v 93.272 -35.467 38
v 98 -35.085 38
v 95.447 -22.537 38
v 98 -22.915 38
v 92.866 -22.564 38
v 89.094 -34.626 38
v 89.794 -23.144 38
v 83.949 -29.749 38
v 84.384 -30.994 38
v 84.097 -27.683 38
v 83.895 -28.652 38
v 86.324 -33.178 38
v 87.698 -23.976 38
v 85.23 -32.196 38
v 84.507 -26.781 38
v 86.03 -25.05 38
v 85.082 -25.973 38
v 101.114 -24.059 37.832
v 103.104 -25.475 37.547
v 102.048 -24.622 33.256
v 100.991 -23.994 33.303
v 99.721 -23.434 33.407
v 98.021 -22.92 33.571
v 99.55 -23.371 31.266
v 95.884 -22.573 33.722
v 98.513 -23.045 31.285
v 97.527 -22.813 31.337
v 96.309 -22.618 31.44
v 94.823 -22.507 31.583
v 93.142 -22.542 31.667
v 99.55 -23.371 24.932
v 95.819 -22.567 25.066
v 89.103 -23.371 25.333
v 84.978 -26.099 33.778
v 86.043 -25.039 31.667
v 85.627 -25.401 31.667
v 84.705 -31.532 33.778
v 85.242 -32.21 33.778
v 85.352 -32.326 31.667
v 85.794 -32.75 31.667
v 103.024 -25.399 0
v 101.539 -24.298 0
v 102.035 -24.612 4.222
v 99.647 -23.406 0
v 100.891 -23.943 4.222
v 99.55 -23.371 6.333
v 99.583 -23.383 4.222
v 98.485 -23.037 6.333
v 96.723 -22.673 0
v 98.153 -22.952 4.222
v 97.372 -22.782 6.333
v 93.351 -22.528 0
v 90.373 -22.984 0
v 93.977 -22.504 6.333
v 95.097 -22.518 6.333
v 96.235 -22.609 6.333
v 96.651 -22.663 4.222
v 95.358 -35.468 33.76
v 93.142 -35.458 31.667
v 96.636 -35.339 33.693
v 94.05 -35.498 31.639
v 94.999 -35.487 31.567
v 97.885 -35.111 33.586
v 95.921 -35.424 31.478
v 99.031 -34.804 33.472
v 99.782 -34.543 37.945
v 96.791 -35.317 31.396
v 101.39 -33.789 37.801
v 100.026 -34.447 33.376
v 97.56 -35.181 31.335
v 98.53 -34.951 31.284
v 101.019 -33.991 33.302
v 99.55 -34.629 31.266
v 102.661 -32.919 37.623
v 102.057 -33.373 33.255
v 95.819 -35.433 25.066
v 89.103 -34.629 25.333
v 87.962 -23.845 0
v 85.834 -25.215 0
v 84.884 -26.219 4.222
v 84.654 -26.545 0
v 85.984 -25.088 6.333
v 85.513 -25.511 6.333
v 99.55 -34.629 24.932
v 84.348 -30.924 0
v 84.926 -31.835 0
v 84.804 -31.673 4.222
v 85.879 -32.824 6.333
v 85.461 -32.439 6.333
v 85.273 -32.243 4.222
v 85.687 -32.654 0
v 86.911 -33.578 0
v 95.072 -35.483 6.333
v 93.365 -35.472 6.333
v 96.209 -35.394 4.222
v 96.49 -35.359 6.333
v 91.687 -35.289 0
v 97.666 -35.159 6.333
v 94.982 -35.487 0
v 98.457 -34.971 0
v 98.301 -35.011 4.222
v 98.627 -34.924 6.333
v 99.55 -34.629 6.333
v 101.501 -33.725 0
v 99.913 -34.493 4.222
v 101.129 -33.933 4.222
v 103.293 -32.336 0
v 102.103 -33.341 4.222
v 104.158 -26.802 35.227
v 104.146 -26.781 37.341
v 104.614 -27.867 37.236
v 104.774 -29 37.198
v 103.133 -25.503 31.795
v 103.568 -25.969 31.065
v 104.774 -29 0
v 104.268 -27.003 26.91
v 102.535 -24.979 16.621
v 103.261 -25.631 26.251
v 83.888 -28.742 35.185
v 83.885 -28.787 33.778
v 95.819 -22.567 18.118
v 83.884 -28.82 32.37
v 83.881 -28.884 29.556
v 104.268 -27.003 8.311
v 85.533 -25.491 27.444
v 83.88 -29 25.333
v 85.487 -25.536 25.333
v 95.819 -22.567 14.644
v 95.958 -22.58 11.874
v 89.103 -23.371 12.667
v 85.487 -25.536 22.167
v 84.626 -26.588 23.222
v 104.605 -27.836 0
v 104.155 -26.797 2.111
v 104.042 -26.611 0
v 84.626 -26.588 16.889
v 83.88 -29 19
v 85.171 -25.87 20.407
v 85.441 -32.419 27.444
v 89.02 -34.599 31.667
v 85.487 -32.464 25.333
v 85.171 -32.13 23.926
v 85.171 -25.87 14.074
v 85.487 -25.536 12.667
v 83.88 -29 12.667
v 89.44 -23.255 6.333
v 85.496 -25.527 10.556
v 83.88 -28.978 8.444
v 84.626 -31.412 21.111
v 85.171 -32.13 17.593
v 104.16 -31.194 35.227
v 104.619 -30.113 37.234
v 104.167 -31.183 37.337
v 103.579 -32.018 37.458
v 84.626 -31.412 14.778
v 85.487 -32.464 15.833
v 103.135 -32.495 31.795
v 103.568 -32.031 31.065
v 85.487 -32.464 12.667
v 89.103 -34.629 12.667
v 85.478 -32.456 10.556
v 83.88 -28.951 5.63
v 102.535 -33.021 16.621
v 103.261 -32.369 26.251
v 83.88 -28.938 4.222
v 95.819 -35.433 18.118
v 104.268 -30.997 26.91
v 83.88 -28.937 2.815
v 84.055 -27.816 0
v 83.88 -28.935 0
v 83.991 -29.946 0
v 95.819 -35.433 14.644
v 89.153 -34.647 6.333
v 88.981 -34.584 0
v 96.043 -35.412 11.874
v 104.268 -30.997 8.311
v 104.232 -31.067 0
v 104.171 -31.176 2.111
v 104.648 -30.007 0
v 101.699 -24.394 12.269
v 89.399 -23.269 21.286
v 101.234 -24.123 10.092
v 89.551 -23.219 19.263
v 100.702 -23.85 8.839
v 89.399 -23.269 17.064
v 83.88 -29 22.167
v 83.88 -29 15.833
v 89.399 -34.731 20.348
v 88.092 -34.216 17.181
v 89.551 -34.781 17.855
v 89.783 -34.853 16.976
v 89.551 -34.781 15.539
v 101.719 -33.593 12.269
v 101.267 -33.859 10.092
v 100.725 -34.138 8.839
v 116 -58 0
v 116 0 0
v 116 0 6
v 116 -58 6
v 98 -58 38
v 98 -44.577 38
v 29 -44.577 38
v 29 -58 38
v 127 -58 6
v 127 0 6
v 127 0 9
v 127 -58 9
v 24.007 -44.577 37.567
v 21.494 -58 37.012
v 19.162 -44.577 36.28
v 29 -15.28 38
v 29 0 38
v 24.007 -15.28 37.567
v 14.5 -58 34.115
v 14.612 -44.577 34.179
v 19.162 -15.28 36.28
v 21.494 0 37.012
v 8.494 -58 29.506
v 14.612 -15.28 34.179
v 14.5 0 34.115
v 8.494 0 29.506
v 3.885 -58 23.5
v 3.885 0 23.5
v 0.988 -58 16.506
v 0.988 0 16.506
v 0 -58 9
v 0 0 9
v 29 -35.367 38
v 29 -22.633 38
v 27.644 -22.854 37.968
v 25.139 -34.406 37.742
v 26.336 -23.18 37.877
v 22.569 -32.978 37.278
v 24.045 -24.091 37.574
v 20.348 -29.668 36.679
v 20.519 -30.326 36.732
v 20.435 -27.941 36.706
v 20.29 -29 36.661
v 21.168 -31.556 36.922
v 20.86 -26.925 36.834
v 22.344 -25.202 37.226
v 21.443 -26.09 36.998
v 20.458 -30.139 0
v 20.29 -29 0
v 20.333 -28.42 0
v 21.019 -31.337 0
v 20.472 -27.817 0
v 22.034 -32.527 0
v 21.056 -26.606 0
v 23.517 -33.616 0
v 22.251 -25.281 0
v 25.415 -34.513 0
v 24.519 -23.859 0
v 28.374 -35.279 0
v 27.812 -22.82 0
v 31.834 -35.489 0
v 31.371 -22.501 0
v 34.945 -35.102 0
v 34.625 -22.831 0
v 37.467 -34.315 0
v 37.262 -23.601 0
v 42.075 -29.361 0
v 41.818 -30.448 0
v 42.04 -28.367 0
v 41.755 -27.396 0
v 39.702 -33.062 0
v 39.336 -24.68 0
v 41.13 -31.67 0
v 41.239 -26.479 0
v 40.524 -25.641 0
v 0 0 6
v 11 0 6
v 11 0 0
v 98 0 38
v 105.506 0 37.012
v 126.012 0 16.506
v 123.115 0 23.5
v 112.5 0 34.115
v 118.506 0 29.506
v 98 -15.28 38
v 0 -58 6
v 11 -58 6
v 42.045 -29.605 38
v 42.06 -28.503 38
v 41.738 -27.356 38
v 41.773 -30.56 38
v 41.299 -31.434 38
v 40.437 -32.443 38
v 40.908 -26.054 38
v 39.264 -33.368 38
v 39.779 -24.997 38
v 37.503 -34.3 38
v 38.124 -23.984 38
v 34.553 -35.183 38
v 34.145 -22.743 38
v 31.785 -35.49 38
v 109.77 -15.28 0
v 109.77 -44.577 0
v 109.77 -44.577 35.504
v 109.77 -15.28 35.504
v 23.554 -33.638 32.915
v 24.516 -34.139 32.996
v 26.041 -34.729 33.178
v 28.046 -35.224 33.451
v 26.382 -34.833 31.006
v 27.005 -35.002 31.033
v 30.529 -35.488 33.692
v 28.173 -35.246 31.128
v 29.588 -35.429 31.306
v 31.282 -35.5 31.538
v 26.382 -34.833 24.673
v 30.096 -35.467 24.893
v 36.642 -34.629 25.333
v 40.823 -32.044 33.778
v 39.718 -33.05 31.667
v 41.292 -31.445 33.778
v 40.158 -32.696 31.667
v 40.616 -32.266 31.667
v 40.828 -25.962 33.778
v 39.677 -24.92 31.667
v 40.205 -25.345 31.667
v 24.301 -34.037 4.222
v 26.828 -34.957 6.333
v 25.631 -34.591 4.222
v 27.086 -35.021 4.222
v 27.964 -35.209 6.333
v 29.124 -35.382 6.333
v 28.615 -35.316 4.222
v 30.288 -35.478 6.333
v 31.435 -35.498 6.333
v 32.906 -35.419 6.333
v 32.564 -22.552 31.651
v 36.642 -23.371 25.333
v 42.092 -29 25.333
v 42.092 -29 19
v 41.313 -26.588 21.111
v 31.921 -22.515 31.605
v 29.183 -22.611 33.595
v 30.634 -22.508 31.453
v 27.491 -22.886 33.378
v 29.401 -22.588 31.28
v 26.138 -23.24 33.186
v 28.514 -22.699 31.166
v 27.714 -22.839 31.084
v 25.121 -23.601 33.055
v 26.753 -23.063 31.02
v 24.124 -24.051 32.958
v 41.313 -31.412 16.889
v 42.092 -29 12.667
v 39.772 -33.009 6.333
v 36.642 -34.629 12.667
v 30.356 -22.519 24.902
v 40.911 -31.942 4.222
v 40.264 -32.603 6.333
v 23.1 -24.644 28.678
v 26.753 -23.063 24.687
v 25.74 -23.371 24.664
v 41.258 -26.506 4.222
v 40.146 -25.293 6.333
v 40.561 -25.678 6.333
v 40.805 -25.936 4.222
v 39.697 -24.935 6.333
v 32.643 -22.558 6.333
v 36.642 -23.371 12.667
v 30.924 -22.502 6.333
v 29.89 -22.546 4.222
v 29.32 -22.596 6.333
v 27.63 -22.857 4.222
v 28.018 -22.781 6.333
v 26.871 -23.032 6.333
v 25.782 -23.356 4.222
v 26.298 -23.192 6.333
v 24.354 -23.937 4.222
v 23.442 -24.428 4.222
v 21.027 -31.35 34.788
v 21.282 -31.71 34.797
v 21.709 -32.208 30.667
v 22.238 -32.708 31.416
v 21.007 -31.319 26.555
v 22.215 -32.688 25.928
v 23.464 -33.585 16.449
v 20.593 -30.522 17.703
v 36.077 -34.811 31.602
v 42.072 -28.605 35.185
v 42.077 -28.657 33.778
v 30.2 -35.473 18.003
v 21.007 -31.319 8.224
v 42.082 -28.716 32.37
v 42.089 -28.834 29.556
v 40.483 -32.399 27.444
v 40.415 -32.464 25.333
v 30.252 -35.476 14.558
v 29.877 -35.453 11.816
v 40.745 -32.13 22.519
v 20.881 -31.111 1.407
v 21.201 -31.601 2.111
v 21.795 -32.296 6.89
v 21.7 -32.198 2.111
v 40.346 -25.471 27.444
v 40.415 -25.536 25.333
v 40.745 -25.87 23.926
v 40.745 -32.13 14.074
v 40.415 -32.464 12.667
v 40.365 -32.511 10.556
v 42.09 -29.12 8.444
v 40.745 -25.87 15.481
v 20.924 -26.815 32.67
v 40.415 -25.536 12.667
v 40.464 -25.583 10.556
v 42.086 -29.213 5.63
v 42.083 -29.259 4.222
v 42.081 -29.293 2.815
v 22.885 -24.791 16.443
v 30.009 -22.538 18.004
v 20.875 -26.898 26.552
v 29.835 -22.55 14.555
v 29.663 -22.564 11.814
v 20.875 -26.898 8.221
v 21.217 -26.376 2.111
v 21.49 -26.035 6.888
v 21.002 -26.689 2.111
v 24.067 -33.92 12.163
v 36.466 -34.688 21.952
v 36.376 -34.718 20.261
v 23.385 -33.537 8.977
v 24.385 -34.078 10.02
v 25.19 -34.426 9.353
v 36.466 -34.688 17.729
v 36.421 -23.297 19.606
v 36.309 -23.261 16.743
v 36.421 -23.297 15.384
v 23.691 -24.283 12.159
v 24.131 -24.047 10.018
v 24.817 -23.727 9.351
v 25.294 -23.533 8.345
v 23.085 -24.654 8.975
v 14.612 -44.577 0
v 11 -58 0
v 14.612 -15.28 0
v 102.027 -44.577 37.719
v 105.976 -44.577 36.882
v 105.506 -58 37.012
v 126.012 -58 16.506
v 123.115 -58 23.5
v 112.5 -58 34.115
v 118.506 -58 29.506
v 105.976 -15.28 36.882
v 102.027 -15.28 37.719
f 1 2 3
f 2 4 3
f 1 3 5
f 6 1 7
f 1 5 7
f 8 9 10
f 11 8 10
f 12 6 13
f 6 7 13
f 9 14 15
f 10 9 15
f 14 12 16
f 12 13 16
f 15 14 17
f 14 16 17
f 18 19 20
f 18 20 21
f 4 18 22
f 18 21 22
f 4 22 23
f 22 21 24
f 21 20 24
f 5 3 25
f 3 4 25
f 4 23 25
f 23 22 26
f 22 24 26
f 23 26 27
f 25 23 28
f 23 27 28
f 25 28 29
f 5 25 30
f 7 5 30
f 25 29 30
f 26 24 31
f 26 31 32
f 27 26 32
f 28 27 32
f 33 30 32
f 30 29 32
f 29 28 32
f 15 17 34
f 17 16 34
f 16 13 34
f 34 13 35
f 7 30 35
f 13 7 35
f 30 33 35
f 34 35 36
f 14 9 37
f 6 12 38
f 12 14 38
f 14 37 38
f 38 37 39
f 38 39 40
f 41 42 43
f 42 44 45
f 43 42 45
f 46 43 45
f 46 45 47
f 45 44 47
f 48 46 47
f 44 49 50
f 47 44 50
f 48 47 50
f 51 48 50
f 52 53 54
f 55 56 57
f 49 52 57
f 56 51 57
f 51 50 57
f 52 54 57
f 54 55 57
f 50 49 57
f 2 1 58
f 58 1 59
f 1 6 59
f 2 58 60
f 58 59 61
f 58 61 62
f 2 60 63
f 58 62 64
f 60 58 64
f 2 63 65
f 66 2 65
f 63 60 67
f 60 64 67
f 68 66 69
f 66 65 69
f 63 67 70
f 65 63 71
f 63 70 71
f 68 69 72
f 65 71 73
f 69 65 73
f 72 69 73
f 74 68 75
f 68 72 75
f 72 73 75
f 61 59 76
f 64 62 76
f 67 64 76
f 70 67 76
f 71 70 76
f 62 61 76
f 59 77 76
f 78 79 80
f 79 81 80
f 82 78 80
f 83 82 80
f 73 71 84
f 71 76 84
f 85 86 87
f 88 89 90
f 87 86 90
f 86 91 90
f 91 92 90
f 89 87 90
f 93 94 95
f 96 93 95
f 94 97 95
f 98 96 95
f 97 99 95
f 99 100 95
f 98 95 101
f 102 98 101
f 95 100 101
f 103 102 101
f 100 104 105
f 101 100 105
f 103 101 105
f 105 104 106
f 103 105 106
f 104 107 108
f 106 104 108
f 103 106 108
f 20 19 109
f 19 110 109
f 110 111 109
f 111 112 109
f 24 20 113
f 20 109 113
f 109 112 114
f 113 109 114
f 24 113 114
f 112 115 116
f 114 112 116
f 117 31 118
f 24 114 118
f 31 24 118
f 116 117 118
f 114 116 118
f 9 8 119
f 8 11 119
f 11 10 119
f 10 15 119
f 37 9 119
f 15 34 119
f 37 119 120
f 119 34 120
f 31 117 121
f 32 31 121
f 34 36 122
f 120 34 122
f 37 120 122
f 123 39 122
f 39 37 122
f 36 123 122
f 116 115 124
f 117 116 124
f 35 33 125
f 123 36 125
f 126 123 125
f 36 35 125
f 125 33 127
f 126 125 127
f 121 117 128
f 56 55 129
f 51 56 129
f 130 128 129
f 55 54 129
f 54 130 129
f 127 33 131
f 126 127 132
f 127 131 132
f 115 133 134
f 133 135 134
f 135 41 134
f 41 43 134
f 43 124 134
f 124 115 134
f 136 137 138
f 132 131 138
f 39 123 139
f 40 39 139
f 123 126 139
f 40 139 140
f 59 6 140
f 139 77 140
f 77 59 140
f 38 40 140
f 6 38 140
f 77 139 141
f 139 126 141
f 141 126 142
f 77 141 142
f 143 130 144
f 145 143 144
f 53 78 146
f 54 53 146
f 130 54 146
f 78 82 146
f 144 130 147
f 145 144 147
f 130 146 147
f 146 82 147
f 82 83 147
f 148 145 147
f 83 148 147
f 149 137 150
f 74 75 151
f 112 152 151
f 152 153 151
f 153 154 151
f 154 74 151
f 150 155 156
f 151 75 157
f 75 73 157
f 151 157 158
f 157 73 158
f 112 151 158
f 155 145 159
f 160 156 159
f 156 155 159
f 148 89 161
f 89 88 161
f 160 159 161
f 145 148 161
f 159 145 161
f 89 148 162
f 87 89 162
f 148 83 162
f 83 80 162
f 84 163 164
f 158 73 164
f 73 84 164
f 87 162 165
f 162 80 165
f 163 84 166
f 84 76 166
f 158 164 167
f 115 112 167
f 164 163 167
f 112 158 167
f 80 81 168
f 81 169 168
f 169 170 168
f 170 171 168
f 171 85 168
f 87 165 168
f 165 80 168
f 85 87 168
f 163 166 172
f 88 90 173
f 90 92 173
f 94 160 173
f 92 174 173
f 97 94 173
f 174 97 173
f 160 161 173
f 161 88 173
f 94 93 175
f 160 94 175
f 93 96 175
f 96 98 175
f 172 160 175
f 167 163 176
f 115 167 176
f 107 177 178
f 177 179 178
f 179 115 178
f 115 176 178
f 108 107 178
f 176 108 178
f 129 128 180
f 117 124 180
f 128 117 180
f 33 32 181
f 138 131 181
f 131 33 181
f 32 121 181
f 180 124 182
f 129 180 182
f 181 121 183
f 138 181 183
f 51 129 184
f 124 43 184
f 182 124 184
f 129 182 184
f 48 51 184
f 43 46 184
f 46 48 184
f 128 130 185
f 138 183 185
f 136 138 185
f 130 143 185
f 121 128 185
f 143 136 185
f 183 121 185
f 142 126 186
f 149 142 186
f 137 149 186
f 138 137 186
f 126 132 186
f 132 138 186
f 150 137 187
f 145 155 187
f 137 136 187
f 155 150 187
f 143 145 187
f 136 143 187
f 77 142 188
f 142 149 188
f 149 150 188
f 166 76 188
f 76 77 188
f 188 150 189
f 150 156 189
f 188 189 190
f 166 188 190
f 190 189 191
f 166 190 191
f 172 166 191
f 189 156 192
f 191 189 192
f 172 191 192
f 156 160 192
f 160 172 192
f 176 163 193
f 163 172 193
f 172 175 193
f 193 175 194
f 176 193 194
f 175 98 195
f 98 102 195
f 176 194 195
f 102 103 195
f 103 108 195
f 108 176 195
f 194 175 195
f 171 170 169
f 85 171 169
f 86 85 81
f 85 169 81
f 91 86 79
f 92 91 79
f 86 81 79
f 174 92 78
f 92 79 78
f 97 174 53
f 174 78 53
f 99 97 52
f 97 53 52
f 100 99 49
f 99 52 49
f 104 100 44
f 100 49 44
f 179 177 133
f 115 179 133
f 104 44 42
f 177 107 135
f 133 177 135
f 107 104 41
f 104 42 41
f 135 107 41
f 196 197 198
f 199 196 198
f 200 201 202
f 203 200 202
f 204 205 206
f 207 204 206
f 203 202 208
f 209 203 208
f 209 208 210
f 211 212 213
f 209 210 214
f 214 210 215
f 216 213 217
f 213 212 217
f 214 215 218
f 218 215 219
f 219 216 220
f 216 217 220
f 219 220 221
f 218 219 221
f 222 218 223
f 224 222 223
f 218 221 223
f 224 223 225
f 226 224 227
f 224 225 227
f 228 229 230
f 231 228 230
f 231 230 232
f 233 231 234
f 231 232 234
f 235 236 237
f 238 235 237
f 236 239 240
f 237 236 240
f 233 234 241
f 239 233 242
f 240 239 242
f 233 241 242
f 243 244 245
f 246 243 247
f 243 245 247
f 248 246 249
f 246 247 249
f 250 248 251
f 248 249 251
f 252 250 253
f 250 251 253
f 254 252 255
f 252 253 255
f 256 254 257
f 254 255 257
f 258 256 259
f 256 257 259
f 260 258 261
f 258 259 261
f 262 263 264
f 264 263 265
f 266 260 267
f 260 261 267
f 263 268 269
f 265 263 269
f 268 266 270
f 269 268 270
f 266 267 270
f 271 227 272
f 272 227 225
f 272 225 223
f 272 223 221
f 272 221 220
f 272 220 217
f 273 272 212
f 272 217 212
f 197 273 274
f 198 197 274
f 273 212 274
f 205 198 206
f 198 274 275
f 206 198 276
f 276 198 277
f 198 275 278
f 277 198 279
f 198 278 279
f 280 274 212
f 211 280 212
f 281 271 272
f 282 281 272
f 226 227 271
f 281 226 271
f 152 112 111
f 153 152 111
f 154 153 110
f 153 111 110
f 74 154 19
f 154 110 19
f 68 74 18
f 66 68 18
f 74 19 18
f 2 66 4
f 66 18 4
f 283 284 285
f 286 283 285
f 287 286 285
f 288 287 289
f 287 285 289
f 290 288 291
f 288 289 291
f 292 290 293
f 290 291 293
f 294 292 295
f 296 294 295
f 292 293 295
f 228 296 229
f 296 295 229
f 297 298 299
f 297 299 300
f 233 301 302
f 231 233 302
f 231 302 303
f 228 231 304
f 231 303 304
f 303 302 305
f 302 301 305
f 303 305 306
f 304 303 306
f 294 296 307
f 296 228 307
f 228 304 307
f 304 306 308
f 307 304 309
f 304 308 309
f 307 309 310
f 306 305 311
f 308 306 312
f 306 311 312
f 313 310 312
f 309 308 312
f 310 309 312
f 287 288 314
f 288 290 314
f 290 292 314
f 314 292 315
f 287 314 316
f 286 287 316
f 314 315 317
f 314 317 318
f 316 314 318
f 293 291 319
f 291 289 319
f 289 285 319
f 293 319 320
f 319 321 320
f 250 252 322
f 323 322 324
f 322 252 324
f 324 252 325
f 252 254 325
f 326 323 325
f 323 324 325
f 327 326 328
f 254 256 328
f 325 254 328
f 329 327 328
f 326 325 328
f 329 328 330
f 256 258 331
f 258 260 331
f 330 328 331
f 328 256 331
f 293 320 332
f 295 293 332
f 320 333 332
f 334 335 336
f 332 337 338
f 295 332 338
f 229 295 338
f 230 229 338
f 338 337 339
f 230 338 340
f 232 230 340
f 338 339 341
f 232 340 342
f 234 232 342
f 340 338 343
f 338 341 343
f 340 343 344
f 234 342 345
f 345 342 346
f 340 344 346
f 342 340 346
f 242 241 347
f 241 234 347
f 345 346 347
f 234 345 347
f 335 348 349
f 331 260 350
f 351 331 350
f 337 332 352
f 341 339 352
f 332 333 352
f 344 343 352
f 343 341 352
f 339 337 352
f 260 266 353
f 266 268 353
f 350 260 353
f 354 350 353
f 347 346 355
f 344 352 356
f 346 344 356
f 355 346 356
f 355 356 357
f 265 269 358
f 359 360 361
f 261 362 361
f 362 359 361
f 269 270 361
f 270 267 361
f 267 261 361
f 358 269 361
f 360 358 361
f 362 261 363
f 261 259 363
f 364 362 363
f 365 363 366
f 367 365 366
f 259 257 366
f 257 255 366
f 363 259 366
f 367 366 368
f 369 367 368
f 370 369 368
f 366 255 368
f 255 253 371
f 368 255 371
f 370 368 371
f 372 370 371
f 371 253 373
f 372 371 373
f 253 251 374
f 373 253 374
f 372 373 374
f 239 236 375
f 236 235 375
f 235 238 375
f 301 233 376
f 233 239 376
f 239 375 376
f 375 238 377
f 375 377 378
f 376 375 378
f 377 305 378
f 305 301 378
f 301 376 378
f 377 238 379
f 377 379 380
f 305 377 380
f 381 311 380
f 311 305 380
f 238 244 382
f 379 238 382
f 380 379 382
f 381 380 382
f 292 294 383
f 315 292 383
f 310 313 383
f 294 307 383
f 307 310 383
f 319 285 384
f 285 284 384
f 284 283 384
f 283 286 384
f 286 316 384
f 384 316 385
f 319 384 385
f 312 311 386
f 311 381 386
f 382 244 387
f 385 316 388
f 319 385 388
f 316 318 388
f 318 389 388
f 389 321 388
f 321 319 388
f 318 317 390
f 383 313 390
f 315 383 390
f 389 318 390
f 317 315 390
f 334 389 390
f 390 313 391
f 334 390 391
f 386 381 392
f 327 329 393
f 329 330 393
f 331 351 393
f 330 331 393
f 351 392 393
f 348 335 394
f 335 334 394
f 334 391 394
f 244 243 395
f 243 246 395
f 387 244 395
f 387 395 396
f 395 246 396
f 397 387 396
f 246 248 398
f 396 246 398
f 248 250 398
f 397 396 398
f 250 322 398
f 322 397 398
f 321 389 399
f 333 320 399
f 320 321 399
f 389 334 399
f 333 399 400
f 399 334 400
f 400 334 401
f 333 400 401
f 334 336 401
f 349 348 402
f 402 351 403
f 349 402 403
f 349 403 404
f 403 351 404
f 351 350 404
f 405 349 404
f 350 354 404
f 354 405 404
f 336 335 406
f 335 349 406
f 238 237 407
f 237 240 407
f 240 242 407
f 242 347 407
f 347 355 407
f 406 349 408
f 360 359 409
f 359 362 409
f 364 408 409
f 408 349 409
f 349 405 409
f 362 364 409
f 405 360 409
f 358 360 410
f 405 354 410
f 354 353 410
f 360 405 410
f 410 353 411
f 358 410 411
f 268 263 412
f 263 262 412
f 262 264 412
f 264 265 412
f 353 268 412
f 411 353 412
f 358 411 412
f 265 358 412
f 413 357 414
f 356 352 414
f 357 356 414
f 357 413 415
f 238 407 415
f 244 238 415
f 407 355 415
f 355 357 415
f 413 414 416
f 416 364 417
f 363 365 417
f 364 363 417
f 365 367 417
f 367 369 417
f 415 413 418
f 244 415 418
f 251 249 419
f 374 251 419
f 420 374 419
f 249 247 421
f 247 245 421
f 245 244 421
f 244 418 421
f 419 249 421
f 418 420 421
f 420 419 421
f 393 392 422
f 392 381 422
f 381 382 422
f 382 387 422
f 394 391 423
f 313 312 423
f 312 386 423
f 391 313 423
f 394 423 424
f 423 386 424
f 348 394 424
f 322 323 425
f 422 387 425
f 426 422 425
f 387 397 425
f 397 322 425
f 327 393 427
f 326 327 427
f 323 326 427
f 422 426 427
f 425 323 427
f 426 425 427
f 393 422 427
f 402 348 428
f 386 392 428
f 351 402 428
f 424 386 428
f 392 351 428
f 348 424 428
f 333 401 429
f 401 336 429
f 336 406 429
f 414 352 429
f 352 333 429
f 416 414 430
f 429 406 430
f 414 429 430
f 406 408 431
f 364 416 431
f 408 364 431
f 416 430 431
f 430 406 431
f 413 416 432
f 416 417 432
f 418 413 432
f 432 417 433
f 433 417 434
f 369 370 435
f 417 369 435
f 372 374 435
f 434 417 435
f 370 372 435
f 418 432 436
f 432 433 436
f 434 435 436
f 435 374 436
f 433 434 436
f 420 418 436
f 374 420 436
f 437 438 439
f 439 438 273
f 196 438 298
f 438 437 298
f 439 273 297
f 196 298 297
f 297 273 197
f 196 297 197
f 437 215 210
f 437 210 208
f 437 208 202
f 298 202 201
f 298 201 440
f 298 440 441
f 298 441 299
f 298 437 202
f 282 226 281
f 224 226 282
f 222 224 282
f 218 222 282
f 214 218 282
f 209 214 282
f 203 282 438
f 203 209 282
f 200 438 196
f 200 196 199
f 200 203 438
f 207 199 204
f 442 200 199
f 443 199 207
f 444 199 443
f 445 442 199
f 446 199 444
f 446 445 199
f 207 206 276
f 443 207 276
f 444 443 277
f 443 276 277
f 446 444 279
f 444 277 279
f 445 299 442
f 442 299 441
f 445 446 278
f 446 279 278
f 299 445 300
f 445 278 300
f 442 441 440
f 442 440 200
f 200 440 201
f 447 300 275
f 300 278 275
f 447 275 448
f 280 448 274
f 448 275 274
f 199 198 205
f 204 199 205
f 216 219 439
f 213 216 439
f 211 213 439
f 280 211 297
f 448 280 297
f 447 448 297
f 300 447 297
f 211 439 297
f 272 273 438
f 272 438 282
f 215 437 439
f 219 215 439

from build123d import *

# Parameters (mm, degrees)
F1_DEPTH = 58
F2_W     = 11
F2_H     = 6
F3_DEPTH = 58
F4_W     = 95.157943
F4_H     = 29.296835
F5_DEPTH = 38.001


with BuildPart() as f1:
    # F0 (on Front) → F1 (new body)
    with BuildSketch(Plane.XZ):
        with BuildLine():
            Line((0, 9), (0, 0))
            Line((0, 0), (127, 0))
            Line((127, 0), (127, 9))
            ThreePointArc((127, 9), (118.506097, 29.506097), (98, 38))
            Line((98, 38), (29, 38))
            ThreePointArc((29, 38), (8.493903, 29.506097), (0, 9))
        make_face()
    extrude(amount=F1_DEPTH)

    # F2 (on Front) → F3 (cut)
    with BuildSketch(Plane.XZ):
        with Locations((121.5, 3)):
            Rectangle(F2_W, F2_H)
        with Locations((5.5, 3)):
            Rectangle(F2_W, F2_H)
    extrude(amount=F3_DEPTH, mode=Mode.SUBTRACT)

    # F4 (on Top) → F5 (cut, through all)
    with BuildSketch(Plane.XY):
        with Locations((62.191074, -29.928551)):
            Rectangle(F4_W, F4_H)
        with BuildLine():
            add(Edge.make_bspline(
                [(20.289784, -29), (20.289784, -40.25833), (36.641508, -34.629165), (52.993232, -29), (36.641508, -23.370835), (20.289784, -17.74167), (20.289784, -29)],
                knots=[0, 0, 0, 2.094395, 2.094395, 4.18879, 4.18879, 6.283185, 6.283185, 6.283185], degree=2, weights=[1, 0.5, 1, 0.5, 1, 0.5, 1]))
        make_face(mode=Mode.SUBTRACT)
        with BuildLine():
            add(Edge.make_bspline(
                [(104.773693, -29), (104.773693, -17.74167), (89.103278, -23.370835), (73.432863, -29), (89.103278, -34.629165), (104.773693, -40.25833), (104.773693, -29)],
                knots=[0, 0, 0, 2.094395, 2.094395, 4.18879, 4.18879, 6.283185, 6.283185, 6.283185], degree=2, weights=[1, 0.5, 1, 0.5, 1, 0.5, 1]))
        make_face(mode=Mode.SUBTRACT)
    extrude(amount=F5_DEPTH, mode=Mode.SUBTRACT)


solid = f1.part
